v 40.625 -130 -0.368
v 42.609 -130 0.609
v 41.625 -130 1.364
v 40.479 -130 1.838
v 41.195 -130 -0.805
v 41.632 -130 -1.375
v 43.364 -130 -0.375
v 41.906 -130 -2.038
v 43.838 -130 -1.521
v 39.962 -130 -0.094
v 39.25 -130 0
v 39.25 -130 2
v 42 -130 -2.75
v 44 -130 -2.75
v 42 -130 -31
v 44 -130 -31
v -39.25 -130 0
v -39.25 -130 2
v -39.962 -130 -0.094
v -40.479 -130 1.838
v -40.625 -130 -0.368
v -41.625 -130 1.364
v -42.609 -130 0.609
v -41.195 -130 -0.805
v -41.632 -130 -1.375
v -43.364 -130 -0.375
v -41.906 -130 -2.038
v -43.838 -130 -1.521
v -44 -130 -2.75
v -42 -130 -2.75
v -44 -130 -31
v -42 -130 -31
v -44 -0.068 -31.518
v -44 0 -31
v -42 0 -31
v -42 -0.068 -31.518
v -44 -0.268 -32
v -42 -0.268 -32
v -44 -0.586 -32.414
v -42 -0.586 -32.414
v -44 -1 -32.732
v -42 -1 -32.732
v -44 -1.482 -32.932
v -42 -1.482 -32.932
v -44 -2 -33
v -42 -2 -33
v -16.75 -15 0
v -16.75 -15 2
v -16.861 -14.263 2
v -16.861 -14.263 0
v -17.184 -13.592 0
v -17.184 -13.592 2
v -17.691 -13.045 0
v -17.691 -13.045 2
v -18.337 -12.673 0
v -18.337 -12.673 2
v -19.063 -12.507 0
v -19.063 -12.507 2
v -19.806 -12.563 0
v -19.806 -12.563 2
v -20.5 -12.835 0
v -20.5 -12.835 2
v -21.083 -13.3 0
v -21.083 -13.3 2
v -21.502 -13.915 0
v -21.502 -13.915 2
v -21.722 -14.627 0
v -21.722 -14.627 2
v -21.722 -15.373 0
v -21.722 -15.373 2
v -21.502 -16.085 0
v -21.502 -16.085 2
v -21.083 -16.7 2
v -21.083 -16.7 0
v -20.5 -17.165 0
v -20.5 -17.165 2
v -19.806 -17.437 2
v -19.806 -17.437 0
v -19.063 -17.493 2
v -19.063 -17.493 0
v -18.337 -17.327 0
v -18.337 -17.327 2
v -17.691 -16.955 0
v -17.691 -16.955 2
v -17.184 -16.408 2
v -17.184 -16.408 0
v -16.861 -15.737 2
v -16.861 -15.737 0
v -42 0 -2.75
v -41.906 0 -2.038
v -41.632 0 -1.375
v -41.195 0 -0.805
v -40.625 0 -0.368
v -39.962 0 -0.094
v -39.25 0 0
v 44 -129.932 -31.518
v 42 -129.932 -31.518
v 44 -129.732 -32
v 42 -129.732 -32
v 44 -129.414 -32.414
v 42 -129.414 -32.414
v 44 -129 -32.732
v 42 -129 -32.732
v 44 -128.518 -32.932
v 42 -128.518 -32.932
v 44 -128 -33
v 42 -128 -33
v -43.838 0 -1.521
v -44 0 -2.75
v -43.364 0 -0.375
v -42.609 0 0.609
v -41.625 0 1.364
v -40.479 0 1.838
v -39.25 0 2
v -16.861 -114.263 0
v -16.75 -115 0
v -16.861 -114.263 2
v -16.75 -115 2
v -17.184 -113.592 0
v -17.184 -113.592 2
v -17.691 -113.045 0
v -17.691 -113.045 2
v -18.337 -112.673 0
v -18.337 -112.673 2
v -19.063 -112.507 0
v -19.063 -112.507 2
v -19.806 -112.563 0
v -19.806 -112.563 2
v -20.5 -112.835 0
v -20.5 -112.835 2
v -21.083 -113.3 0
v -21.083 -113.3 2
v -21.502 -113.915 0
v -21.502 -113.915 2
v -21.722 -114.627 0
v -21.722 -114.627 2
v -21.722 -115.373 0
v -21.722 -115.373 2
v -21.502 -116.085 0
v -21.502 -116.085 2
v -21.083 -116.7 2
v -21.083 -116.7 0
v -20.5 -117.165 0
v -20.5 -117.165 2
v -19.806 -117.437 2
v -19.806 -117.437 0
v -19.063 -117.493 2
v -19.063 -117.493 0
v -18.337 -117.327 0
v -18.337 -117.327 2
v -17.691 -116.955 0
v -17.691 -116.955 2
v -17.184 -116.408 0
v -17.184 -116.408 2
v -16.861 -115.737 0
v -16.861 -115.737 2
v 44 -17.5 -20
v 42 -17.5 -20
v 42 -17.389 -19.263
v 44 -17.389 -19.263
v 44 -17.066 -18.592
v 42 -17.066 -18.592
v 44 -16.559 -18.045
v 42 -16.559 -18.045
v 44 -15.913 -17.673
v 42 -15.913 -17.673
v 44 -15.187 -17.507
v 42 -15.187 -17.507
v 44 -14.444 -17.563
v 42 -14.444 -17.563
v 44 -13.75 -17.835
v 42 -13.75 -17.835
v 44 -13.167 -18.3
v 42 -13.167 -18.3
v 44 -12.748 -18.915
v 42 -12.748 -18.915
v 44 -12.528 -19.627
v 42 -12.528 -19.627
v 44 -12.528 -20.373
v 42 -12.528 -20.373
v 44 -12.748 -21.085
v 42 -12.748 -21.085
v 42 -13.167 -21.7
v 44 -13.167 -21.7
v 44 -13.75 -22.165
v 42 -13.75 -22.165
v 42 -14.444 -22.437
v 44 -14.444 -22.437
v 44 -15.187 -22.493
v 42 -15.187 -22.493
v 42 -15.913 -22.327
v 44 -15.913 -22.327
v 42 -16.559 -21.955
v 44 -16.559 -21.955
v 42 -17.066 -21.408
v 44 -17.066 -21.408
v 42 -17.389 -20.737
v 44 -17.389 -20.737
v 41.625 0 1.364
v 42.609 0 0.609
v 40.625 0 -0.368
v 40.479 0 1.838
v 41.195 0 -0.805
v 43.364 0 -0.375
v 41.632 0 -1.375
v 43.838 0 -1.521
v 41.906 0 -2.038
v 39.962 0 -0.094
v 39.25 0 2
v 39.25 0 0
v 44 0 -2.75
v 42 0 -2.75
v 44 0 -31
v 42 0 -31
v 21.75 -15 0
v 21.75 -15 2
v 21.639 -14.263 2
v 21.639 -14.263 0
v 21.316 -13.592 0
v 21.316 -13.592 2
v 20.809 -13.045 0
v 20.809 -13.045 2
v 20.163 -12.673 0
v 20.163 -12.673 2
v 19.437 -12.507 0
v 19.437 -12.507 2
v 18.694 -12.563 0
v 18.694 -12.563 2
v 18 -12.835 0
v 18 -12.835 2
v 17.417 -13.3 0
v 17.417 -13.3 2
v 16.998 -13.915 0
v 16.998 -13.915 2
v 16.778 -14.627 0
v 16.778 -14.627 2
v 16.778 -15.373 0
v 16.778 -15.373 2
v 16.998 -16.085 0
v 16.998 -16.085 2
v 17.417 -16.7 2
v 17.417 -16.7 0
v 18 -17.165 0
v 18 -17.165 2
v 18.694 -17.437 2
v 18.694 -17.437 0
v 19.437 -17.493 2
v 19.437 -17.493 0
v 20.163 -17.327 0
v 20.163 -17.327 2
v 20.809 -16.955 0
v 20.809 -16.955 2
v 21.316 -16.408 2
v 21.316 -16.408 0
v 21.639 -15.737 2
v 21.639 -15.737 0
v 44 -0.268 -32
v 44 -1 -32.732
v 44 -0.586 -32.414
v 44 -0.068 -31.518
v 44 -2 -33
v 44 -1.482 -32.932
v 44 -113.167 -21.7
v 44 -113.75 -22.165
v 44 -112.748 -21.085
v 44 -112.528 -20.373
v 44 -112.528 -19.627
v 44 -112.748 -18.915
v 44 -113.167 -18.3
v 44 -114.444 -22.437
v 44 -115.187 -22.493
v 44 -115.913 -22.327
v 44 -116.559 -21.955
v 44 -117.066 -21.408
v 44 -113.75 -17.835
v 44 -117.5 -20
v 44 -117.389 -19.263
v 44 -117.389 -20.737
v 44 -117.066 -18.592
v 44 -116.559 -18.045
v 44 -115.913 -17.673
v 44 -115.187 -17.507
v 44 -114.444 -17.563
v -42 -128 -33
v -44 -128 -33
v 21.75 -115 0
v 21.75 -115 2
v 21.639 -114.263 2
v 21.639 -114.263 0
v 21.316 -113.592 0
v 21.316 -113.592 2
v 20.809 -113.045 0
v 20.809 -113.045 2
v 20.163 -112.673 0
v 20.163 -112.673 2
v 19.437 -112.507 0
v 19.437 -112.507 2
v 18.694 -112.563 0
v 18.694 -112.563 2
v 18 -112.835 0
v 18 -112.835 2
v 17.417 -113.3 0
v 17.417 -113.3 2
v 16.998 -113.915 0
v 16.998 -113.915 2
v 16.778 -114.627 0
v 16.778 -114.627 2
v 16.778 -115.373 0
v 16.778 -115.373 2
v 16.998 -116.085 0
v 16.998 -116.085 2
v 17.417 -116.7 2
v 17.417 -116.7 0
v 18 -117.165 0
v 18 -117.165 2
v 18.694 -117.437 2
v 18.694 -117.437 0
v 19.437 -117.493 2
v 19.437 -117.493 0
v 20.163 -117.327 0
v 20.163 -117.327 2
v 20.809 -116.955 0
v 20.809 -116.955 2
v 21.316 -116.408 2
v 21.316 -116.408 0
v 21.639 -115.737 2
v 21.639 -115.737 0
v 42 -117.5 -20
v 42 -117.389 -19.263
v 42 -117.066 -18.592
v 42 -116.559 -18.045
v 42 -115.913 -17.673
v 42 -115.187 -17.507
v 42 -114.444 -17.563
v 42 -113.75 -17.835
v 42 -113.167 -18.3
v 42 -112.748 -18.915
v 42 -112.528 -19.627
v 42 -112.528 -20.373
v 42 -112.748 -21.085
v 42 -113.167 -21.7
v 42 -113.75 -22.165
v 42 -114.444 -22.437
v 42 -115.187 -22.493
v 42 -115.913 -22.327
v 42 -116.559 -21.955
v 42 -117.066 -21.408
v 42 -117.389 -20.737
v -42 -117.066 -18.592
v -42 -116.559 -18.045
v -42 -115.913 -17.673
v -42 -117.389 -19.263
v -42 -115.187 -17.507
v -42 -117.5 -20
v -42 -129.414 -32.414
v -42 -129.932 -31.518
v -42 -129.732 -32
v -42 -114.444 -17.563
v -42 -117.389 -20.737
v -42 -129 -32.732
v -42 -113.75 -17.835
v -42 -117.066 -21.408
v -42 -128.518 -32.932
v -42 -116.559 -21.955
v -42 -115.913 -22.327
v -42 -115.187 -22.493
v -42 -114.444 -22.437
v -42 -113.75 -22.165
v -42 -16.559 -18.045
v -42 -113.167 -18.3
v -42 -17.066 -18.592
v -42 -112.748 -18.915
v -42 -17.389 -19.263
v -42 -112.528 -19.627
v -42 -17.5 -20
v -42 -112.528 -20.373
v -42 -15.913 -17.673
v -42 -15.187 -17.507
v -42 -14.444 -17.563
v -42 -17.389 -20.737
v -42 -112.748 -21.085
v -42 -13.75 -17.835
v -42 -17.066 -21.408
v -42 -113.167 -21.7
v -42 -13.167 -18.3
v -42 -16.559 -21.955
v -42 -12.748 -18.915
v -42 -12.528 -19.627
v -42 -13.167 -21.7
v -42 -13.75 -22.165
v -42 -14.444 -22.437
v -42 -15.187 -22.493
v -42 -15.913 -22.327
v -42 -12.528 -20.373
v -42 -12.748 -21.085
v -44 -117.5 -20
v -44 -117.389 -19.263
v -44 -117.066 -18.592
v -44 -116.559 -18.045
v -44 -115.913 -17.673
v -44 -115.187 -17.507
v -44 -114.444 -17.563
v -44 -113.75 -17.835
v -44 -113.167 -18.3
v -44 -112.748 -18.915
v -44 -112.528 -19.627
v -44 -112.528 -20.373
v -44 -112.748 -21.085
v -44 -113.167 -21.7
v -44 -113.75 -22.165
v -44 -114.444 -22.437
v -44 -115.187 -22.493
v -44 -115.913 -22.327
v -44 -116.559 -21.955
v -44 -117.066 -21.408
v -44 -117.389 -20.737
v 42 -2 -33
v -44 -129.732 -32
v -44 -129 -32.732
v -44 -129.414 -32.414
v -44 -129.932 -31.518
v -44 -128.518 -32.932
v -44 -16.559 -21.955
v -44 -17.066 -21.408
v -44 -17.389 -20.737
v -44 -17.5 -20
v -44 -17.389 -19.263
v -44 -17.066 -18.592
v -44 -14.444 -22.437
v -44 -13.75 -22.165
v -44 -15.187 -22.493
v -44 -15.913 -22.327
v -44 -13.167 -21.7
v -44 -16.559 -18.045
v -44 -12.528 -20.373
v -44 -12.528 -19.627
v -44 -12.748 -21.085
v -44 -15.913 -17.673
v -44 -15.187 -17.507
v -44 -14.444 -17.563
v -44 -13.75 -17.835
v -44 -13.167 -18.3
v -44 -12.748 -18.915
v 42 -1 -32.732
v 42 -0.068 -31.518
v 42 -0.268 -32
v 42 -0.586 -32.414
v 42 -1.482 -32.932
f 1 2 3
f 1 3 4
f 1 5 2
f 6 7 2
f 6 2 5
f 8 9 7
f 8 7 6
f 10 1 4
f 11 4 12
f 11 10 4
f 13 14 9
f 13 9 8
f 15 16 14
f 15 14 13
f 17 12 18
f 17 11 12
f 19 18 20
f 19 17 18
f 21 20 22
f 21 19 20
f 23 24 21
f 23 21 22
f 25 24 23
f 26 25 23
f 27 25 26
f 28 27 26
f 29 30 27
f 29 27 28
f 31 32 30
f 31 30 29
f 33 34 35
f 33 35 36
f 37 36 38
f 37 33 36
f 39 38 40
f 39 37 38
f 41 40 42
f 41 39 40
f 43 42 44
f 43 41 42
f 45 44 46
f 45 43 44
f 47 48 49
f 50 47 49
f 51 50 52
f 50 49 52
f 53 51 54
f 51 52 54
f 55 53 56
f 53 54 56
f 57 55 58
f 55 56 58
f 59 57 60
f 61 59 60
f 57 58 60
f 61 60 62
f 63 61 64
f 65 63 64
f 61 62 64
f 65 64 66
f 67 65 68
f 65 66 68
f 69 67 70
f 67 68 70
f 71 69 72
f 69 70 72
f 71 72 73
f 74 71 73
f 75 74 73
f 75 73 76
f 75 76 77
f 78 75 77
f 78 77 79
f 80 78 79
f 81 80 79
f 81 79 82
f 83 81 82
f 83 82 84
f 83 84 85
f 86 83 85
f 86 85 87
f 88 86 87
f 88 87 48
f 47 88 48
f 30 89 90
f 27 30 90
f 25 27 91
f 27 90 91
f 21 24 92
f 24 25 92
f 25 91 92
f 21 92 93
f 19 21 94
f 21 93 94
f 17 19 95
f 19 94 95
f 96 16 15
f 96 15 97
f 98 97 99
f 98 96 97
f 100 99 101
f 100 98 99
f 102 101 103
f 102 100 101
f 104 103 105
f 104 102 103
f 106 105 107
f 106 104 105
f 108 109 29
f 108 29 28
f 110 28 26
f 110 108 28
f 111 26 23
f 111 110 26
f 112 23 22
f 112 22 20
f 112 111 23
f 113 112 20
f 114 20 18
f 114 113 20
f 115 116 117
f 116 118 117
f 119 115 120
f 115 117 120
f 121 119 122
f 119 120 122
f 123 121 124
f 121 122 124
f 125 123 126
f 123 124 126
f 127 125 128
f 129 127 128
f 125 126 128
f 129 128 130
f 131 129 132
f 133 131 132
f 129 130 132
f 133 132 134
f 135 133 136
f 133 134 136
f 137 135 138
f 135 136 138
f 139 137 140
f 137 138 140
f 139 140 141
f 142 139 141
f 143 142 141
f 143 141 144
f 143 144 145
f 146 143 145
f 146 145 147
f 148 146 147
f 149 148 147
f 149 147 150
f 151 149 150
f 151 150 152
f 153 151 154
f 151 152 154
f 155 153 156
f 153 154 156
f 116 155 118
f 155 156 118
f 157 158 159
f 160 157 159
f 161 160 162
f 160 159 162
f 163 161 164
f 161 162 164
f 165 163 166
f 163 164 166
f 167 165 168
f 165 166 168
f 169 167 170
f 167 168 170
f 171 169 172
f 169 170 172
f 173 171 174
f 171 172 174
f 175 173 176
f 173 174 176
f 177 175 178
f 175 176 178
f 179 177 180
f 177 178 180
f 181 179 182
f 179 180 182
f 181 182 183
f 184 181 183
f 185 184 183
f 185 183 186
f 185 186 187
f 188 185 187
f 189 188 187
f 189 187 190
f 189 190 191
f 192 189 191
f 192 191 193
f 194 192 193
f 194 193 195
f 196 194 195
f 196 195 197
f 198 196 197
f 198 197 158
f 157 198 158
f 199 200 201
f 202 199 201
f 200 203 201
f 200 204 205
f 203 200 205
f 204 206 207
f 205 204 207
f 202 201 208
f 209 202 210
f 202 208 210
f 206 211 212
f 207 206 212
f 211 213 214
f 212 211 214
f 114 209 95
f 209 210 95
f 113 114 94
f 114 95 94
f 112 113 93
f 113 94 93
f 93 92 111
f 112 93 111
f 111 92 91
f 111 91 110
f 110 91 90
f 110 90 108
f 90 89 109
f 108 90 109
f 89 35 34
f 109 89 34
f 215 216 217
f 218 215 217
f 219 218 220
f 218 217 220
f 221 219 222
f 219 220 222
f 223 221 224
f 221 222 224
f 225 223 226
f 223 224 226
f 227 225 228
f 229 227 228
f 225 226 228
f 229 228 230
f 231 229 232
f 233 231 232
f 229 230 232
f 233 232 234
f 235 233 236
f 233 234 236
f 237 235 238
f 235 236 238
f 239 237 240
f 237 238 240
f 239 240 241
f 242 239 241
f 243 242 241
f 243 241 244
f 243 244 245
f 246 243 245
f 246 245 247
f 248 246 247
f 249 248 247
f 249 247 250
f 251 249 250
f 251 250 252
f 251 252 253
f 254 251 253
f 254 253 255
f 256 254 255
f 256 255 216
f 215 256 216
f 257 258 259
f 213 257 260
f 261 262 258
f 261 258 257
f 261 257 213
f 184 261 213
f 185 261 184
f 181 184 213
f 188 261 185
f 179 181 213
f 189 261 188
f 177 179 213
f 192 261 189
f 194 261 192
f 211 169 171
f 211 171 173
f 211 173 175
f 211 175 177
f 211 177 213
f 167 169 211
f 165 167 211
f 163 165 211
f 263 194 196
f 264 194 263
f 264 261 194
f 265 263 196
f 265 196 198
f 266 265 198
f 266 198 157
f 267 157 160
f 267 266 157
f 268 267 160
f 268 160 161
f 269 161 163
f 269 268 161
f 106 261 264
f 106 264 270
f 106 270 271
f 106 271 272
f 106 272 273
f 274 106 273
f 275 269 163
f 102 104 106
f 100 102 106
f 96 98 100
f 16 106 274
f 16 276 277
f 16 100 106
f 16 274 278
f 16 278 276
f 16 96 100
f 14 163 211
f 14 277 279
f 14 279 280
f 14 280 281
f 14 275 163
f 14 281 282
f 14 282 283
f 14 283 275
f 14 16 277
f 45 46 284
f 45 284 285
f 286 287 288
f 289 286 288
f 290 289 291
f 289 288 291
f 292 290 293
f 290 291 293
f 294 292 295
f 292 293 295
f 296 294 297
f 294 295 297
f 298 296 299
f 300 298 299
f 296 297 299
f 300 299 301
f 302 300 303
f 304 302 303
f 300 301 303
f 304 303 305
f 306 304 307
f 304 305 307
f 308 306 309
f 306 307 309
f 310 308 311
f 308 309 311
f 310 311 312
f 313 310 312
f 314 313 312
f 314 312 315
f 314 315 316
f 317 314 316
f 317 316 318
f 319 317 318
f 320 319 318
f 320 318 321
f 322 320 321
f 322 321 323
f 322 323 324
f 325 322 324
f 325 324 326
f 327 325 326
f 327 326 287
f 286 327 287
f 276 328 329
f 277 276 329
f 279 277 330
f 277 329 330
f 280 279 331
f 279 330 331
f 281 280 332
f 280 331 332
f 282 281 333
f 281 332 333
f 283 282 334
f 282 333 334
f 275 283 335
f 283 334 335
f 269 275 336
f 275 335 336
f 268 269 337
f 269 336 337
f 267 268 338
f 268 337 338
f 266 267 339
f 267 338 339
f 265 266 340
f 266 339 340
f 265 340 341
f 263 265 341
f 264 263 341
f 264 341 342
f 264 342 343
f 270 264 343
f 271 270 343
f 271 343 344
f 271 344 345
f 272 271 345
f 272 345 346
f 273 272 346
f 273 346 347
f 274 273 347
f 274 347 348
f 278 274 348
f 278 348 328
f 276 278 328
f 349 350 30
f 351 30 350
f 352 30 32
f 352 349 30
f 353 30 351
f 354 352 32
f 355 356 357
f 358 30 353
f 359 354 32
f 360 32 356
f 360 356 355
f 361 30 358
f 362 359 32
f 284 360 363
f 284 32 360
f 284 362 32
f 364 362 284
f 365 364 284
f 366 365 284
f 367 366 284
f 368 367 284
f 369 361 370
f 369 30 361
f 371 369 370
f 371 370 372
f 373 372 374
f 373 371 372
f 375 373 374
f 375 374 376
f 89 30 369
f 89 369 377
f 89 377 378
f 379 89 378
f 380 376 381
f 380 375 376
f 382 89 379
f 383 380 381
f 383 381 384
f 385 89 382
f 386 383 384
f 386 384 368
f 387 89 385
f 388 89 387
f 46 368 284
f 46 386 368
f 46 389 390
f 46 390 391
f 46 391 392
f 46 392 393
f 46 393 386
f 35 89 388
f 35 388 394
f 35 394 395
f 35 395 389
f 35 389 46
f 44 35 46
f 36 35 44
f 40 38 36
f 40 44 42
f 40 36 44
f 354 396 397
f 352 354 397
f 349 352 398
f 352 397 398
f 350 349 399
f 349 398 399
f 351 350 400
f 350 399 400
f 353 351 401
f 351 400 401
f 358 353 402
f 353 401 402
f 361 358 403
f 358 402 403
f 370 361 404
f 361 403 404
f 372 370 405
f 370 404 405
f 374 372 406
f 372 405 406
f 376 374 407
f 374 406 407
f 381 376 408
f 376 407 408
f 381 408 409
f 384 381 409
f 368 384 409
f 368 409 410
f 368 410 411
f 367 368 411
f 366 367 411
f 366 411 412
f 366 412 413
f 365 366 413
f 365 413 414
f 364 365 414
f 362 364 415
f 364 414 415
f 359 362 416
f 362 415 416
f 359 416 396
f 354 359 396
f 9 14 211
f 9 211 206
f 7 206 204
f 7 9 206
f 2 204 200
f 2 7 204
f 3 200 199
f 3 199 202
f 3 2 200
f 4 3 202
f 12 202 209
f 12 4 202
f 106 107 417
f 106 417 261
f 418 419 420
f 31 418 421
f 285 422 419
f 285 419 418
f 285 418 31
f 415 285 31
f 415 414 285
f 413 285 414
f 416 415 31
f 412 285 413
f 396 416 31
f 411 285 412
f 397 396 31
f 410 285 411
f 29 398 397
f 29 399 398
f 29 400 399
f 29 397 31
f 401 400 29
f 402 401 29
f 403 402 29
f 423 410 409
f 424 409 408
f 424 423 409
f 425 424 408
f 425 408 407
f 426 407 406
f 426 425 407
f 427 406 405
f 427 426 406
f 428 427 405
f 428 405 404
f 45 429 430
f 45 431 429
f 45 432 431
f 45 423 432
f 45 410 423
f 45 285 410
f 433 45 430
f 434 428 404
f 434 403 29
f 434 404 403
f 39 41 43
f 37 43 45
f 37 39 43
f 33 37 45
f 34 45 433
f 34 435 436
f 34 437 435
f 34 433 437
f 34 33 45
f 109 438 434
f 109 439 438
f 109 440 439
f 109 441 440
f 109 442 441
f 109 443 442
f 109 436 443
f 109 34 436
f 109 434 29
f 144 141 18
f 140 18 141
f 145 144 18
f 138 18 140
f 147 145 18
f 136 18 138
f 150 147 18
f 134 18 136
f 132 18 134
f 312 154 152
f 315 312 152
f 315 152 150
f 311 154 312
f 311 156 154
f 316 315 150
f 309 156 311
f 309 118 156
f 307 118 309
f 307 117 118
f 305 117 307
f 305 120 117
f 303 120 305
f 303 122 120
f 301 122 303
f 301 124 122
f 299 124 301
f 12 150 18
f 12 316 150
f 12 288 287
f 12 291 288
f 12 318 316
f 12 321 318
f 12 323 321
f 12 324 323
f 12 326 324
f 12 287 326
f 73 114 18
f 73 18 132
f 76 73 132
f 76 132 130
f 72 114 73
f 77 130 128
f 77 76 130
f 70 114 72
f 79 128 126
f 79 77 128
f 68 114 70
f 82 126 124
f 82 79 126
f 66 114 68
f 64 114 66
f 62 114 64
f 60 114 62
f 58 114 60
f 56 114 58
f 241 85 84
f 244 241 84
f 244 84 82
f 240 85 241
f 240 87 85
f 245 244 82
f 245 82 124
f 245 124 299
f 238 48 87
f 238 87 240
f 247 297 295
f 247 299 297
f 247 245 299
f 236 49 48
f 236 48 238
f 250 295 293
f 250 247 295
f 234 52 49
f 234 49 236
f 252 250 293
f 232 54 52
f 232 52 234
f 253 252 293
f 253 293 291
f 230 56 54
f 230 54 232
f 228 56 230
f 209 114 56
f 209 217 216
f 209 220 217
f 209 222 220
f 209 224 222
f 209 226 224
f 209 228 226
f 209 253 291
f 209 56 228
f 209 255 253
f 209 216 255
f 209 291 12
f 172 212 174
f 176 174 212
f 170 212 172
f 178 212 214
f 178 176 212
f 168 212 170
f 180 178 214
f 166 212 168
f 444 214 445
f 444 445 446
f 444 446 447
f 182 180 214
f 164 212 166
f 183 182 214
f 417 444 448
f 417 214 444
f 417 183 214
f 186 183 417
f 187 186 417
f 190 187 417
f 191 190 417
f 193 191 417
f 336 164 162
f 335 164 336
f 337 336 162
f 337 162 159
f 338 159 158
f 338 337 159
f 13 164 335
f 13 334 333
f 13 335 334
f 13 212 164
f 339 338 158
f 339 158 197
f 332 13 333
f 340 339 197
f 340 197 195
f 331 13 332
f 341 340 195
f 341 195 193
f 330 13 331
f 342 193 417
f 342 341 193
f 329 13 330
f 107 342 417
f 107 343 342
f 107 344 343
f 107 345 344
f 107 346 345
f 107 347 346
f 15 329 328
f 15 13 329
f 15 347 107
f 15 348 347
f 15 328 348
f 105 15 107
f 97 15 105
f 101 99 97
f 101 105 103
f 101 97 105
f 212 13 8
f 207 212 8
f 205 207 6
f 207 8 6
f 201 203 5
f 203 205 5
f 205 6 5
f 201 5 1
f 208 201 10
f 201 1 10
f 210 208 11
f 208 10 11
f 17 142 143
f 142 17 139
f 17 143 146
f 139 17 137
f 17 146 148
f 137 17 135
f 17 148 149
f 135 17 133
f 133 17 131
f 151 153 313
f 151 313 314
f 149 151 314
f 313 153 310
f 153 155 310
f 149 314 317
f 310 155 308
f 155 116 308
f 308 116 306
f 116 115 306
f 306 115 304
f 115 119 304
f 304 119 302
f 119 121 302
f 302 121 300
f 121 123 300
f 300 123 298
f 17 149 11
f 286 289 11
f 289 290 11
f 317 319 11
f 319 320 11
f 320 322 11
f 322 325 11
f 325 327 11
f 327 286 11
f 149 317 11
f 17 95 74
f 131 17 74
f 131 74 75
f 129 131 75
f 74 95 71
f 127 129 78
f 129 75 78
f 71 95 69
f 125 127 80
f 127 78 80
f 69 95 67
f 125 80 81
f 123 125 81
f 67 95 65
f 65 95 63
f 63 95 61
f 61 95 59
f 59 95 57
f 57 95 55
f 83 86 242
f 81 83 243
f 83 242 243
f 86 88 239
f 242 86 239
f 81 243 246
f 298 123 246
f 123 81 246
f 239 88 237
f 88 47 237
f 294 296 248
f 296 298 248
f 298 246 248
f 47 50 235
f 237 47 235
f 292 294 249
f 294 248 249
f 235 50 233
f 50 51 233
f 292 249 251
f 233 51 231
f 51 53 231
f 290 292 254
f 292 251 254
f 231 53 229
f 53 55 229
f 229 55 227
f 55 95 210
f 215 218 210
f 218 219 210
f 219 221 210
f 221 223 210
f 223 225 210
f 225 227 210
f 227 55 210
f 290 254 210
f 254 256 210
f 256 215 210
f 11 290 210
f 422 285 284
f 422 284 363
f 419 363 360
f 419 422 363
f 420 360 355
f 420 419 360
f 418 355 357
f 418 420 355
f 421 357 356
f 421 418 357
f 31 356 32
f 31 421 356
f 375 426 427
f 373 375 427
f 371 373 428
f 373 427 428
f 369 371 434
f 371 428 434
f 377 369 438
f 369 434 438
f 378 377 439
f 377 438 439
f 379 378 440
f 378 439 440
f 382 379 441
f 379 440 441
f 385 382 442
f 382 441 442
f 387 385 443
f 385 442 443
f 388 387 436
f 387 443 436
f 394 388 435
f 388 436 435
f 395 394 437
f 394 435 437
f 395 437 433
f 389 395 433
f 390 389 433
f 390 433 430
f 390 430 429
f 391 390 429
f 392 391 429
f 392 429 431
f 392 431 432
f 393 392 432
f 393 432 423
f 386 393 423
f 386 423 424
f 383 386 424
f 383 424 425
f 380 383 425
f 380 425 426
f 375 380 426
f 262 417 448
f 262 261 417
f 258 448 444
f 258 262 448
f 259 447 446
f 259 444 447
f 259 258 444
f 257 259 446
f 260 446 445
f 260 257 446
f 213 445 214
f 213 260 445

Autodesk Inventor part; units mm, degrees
ref_plane "YZ Plane" through (0, 0, 0) normal (1, 0, 0) x (0, 1, 0)
ref_plane "XZ Plane" through (0, 0, 0) normal (0, 1, 0) x (-1, 0, 0)
ref_plane "XY Plane" through (0, 0, 0) normal (0, 0, 1) x (1, 0, 0)
sketch "Sketch1" plane through (0, 0, 0) normal (0, 0, 1) x (1, 0, 0)
  line L0 (-42, 0) -> (42, 0)
  line L1 (42, 0) -> (42, -130)
  line L2 (42, -130) -> (-42, -130)
  line L3 (-42, -130) -> (-42, 0)
  point P0 (0, 0)
  point P1 (0, 0)
  dimension "d0" = 84
  dimension "d1" = 130
extrude "Plate1" add sketch "Sketch1" along normal blind 2
sketch "Sketch2" plane through (42, -130, 0) normal (1, 0, 0) x (0, 1, 0)
  line L0 (130, 0) -> (0, 0)
  line L1 (0, 0) -> (0, -33)
  line L2 (0, -33) -> (130, -33)
  line L3 (130, -33) -> (130, 0)
edge flange "Flange1" height 35 angle 90 thickness 2 bend radius 2.75 thickness toward (1, 0, 0) relief round relief width 2 relief depth 1 corner gap 2.75 corner form 0 edges at (42, -65, 0) (-42, -65, 0) wall of the first edge with corners at (42, 0, 0) (42, -130, 0) (42, -130, -33) (42, 0, -33)
bend "Bend1"
corner "Corner1"
sketch "Sketch3" plane through (0, 0, 0) normal (1, 0, 0) x (0, 1, 0)
  line L0 (0, -33) -> (-130, -33) projected
  line L1 (-115, -20) -> (-115, -20) construction
  line L2 (-117.5, -20) -> (-117.5, -20)
  line L3 (-112.5, -20) -> (-112.5, -20)
  arc A0 (-112.5, -20) -> (-117.5, -20) centre (-115, -20) ccw
  arc A1 (-117.5, -20) -> (-112.5, -20) centre (-115, -20) ccw
  line L4 (-130, -2.75) -> (-130, -33) projected
  point P0 (0, 0)
  point P1 (-115, -20)
  dimension "d14" = 0
  dimension "d15" = 13
  dimension "d17" = 2.5
  dimension "d18" = 15
extrude "Extrusion1" cut sketch "Sketch3" along normal through all both and the other way through all
sketch "Sketch6" plane through (0, 0, 2) normal (0, 0, 1) x (1, 0, 0)
  line L0 (-39.25, 0) -> (39.25, 0) projected
  circle A0 centre (19.25, -115) radius 2.5
  line L1 (44, -112.5) -> (44, -117.5) projected
  circle A1 centre (-19.25, -115) radius 2.5
  line L2 (39.25, -130) -> (39.25, 0) projected
  line L3 (0, 0) -> (0, -130) construction
  line L4 (-39.25, -130) -> (39.25, -130) projected
  point P0 (0, 0)
  point P1 (44, -115)
  dimension "d27" = 5
  dimension "d33" = 20
extrude "Extrusion3" cut sketch "Sketch6" against normal blind 10
fillet "Fillet1" radius 2 4 edges at (43, 0, -33) (-43, 0, -33) (43, -130, -33) (-43, -130, -33)
pattern_linear "Rectangular Pattern2" count 2 spacing 100 along (0, 1, 0) of "Extrusion1", "Extrusion3"
equation "\"d2\" = Thickness"
equation "\"d3\" = BendReliefWidth"
equation "\"d4\" = BendReliefDepth"
equation "\"d5\" = MinimumRemnant"
equation "\"d6\" = TransitionRadius"
equation "\"d9\" = BendRadius"
equation "\"d10\" = CornerReliefSize"
equation "\"d11\" = GapSize"
equation "\"d12\" = JacobiRadiusSize"
equation "\"BendReliefWidth\" = Thickness"
equation "\"BendReliefDepth\" = 0.5 * Thickness"
equation "\"CornerReliefSize\" = 4 * Thickness"
equation "\"MinimumRemnant\" = 2 * Thickness"
equation "\"TransitionRadius\" = BendRadius"
equation "\"JacobiRadiusSize\" = BendRadius"
equation "\"GapSize\" = Thickness"
equation "\"Thickness\" = 2"
equation "\"BendRadius\" = 2.75"
properties part number "NDM 11.029 bracket 29" material "Stainless Steel"
